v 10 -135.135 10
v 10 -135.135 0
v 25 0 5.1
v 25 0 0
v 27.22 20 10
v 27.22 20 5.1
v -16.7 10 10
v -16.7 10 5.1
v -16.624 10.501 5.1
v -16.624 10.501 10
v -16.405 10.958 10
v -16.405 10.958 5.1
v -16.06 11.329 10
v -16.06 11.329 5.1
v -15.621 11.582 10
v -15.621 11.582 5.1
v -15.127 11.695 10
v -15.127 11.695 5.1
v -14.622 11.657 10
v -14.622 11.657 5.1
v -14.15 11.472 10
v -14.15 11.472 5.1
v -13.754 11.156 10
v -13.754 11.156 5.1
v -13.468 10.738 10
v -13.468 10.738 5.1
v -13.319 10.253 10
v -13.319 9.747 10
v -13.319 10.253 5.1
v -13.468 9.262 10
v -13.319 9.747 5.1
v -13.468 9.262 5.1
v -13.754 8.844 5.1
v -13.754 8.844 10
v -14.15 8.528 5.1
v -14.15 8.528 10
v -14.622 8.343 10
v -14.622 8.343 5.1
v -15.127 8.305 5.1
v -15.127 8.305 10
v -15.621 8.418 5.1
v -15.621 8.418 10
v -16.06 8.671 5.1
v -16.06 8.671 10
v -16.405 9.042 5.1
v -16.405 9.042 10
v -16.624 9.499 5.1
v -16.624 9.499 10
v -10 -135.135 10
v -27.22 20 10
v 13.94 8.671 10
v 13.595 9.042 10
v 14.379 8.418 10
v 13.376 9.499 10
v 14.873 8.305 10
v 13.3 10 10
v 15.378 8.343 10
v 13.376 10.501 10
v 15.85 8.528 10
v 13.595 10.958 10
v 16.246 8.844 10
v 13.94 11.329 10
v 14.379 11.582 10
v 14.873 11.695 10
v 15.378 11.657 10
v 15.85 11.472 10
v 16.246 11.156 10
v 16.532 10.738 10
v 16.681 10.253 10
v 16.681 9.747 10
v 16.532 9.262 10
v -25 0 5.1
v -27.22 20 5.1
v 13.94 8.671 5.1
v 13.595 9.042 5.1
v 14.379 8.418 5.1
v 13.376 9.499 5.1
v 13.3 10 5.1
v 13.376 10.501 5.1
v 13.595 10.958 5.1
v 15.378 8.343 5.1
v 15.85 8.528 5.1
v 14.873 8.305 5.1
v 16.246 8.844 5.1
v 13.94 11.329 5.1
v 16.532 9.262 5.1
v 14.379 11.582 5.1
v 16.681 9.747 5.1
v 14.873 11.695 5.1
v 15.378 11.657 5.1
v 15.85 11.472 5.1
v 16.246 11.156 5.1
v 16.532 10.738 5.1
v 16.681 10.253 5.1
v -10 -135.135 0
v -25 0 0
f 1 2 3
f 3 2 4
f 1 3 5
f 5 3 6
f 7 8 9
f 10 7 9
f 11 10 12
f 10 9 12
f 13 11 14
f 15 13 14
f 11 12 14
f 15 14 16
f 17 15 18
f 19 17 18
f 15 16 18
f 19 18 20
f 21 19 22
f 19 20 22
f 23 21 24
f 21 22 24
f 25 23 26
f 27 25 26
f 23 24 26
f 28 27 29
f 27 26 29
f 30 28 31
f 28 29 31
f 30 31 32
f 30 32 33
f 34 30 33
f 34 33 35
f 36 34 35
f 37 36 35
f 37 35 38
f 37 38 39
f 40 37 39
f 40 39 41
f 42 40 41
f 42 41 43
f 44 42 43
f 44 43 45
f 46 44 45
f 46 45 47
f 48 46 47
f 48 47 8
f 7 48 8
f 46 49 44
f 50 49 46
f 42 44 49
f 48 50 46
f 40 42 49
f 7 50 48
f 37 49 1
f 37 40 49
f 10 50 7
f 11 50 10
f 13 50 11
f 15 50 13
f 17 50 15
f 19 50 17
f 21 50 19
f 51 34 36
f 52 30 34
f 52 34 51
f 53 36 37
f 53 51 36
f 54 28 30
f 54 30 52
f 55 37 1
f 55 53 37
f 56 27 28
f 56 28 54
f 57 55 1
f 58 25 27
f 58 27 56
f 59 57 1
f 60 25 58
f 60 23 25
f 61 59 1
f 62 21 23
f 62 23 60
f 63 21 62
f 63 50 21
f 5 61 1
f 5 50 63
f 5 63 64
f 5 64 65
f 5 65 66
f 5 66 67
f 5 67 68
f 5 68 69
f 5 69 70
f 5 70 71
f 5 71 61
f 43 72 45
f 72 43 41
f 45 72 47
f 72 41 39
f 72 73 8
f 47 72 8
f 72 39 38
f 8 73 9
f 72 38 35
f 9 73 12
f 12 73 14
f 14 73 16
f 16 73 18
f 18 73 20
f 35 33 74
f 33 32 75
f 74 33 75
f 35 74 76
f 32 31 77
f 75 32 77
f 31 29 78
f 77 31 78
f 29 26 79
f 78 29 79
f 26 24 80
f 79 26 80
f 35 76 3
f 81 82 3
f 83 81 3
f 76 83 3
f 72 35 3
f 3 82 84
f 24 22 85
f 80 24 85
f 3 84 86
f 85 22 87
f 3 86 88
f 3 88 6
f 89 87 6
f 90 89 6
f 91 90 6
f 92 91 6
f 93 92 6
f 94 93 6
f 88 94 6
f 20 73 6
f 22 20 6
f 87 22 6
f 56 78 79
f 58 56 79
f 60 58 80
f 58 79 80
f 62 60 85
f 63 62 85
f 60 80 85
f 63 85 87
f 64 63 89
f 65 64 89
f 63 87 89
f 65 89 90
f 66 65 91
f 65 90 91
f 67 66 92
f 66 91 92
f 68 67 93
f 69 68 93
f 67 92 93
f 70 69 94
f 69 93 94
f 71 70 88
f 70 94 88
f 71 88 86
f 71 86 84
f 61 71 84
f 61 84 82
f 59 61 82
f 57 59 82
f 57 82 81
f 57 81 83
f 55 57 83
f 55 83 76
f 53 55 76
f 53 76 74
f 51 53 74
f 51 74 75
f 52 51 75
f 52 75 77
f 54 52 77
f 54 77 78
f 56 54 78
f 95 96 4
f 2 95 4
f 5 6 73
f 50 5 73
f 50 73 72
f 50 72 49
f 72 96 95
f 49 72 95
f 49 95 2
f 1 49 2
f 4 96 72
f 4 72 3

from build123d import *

# Parameters (mm, degrees)
BOSS_EXTRUDE1_DEPTH = 10
CUT_EXTRUDE1_DEPTH  = 5.1
SKETCH2_R           = 1.7
CUT_EXTRUDE2_DEPTH  = 5.1


with BuildPart() as part:
    # Sketch1 → Boss-Extrude1 (new body)
    with BuildSketch(Plane.XY):
        Polygon((-27.22, 20), (-10, -135.135135135), (10, -135.135135135), (27.22, 20), align=None)
    extrude(amount=BOSS_EXTRUDE1_DEPTH)

    # Sketch1<3> → Cut-Extrude1 (cut)
    with BuildSketch(Plane.XY):
        Polygon((-27.22, 20), (-25, 0), (25, 0), (27.22, 20), align=None)
    extrude(amount=CUT_EXTRUDE1_DEPTH, mode=Mode.SUBTRACT)

    # Sketch2 → Cut-Extrude2 (cut)
    with BuildSketch(Plane(origin=(0, 0, 5.1), x_dir=(-1, 0, 0), z_dir=(0, 0, -1))):
        with Locations((-15, 10)):
            Circle(SKETCH2_R)
        with Locations((15, 10)):
            Circle(SKETCH2_R)
    extrude(amount=-CUT_EXTRUDE2_DEPTH, mode=Mode.SUBTRACT)


solid = part.part
